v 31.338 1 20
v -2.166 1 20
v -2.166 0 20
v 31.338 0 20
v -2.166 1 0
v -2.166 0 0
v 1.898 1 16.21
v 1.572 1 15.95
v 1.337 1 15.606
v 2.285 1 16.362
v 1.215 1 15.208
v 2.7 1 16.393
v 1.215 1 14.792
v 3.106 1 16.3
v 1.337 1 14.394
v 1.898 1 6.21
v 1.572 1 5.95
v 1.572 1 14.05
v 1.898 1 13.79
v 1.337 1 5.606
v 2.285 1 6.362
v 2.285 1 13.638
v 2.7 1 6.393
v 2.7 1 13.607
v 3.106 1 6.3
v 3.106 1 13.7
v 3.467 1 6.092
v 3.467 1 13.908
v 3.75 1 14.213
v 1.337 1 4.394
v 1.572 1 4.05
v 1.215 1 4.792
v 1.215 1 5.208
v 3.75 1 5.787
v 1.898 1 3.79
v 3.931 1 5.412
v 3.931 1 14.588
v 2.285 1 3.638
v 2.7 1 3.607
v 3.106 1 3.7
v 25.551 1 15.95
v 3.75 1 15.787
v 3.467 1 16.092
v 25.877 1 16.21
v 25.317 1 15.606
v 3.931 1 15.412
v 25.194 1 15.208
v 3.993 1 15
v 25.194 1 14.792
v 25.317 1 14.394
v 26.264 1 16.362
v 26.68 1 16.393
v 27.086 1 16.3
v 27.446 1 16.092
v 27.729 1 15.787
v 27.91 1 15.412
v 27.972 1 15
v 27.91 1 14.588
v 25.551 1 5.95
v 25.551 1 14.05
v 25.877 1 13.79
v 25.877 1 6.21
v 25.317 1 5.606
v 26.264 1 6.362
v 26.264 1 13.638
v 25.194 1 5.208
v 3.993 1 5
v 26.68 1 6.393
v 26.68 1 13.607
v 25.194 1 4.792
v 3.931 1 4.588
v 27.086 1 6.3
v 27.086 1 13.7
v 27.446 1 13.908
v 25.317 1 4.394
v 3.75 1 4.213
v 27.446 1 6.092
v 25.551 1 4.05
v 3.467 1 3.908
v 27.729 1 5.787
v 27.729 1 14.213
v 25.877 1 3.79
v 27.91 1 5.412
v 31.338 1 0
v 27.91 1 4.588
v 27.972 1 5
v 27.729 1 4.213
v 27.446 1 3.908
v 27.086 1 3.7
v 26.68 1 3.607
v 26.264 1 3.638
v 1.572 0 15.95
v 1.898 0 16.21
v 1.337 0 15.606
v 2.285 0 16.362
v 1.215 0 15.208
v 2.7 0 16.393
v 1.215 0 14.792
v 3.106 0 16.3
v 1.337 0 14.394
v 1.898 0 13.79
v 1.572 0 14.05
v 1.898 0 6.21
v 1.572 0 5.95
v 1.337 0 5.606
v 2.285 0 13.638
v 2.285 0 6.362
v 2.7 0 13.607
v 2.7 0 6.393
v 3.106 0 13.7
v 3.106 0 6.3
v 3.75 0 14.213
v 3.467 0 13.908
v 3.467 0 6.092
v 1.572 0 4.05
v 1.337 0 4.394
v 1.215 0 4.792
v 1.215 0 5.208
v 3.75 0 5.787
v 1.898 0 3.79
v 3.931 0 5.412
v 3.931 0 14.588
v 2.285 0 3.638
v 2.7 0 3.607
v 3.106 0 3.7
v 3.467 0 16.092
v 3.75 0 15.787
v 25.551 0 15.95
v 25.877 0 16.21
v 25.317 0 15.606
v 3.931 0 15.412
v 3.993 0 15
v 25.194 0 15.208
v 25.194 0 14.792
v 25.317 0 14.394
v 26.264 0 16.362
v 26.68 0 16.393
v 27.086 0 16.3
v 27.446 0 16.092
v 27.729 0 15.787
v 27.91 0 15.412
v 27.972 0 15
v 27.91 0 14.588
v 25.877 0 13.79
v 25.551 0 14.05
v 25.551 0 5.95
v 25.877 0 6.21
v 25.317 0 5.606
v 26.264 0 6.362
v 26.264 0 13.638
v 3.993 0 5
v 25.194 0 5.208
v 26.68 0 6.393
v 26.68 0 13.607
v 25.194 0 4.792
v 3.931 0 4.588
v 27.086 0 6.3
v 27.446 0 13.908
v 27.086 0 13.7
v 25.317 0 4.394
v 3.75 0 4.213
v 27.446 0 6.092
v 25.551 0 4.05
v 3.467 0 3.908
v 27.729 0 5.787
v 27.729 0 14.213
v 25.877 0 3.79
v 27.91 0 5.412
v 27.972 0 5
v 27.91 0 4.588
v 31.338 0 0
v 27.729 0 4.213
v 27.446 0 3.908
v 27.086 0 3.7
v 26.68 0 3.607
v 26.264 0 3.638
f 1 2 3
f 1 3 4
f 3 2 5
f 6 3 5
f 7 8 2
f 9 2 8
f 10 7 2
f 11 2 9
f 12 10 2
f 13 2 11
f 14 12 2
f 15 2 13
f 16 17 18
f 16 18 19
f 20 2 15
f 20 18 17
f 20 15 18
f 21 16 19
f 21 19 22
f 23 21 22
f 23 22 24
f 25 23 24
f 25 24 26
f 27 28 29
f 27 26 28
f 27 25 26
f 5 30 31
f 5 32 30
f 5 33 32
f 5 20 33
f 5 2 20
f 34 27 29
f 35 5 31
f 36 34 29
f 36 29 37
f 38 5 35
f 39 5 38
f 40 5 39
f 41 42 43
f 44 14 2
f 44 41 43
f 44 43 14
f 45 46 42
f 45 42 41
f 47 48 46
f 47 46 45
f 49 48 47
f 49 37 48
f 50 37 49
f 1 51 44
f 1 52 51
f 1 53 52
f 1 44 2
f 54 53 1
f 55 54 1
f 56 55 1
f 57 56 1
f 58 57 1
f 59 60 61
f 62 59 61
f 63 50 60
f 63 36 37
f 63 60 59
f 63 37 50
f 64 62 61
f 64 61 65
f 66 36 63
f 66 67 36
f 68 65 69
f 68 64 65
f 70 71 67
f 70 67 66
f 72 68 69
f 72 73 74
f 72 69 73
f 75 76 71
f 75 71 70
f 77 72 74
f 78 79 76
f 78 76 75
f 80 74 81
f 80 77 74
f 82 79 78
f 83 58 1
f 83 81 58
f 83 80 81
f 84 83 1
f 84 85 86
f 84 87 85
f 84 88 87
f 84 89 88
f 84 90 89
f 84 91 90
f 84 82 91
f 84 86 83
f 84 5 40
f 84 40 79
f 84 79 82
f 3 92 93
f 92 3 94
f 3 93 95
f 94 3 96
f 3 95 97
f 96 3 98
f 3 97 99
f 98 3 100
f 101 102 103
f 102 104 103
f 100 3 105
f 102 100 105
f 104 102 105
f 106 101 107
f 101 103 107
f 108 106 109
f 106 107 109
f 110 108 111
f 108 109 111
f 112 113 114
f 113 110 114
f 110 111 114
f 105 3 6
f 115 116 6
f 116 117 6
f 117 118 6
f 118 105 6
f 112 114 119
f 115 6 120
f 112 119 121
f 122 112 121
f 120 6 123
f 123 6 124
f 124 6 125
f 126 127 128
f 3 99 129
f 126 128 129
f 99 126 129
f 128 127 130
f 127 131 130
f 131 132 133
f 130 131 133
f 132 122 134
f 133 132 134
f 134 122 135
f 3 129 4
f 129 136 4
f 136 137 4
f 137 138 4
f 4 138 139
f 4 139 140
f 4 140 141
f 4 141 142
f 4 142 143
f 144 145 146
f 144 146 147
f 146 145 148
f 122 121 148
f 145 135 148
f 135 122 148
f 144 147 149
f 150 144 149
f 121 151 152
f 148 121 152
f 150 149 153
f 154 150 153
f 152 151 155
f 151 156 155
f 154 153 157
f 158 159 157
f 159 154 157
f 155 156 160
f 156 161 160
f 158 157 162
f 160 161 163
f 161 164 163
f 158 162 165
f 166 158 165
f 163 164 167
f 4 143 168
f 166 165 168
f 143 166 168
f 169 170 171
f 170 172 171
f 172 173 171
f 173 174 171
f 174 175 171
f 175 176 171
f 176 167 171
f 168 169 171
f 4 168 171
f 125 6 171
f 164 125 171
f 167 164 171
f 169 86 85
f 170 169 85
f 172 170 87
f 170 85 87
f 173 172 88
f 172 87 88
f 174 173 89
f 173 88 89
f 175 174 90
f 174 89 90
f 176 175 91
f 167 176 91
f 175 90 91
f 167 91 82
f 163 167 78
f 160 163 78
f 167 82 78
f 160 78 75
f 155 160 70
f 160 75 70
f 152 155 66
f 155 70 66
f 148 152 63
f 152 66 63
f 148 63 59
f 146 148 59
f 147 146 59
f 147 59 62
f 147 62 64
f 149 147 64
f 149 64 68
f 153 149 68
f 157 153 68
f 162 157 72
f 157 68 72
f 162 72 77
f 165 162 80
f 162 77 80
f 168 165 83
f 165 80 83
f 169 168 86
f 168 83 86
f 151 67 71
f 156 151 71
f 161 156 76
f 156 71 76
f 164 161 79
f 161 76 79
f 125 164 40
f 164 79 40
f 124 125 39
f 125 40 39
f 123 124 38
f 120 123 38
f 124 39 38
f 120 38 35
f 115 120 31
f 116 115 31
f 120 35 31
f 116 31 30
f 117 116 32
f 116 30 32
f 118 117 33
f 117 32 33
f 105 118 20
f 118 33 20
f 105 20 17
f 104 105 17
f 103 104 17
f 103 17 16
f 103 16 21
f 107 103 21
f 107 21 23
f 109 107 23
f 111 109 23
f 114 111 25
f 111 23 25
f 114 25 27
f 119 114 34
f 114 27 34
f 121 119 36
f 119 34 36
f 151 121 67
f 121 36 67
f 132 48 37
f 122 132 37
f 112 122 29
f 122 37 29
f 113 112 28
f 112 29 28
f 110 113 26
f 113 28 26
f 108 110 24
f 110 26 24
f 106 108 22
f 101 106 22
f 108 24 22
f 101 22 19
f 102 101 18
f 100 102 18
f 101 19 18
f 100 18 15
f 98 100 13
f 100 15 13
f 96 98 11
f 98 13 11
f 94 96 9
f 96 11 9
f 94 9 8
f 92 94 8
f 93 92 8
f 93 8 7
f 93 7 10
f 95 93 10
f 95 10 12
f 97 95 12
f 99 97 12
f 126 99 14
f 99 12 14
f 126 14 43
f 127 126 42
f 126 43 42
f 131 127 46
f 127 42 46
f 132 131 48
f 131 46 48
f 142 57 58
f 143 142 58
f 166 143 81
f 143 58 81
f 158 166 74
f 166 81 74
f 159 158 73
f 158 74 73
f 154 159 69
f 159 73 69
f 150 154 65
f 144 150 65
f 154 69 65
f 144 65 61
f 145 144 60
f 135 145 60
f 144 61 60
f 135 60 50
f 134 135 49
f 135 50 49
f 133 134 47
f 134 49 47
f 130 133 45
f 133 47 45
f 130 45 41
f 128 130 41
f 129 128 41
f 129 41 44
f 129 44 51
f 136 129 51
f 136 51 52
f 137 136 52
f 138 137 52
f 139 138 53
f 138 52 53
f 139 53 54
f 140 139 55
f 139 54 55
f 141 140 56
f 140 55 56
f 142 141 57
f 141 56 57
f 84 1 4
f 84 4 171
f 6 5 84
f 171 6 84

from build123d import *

# Parameters (mm, degrees)
BOSS_EXTRUDE1_DEPTH = 20
SKETCH6_R           = 1.397
CUT_EXTRUDE1_DEPTH  = 1
SKETCH7_W           = 2.16646989
SKETCH7_H           = 20
BOSS_EXTRUDE2_DEPTH = 1


with BuildPart() as part:
    # Sketch1 → Boss-Extrude1 (new body)
    with BuildSketch(Plane.XY):
        Polygon((0, 0), (2.596030114, 0), (29.171217845, 0), (29.171217845, 1), (26.575187731, 1), (0, 1), align=None)
    extrude(amount=BOSS_EXTRUDE1_DEPTH)

    # Sketch6 → Cut-Extrude1 (cut)
    with BuildSketch(Plane(origin=(0, 1, 0), x_dir=(1, 0, 0), z_dir=(0, 1, 0))):
        with Locations((26.575187731, -15.000000033)):
            Circle(SKETCH6_R)
        with Locations((2.596030114, -15.000000033)):
            Circle(SKETCH6_R)
        with Locations((2.596030114, -4.999999967)):
            Circle(SKETCH6_R)
        with Locations((26.575187731, -4.999999967)):
            Circle(SKETCH6_R)
    extrude(amount=-CUT_EXTRUDE1_DEPTH, mode=Mode.SUBTRACT)

    # Sketch7 → Boss-Extrude2 (add)
    with BuildSketch(Plane(origin=(0, 1, 0), x_dir=(1, 0, 0), z_dir=(0, 1, 0))):
        with Locations((30.25445279, -10)):
            Rectangle(SKETCH7_W, SKETCH7_H)
        with Locations((-1.083234945, -10)):
            Rectangle(SKETCH7_W, SKETCH7_H)
    extrude(amount=-BOSS_EXTRUDE2_DEPTH)


solid = part.part
